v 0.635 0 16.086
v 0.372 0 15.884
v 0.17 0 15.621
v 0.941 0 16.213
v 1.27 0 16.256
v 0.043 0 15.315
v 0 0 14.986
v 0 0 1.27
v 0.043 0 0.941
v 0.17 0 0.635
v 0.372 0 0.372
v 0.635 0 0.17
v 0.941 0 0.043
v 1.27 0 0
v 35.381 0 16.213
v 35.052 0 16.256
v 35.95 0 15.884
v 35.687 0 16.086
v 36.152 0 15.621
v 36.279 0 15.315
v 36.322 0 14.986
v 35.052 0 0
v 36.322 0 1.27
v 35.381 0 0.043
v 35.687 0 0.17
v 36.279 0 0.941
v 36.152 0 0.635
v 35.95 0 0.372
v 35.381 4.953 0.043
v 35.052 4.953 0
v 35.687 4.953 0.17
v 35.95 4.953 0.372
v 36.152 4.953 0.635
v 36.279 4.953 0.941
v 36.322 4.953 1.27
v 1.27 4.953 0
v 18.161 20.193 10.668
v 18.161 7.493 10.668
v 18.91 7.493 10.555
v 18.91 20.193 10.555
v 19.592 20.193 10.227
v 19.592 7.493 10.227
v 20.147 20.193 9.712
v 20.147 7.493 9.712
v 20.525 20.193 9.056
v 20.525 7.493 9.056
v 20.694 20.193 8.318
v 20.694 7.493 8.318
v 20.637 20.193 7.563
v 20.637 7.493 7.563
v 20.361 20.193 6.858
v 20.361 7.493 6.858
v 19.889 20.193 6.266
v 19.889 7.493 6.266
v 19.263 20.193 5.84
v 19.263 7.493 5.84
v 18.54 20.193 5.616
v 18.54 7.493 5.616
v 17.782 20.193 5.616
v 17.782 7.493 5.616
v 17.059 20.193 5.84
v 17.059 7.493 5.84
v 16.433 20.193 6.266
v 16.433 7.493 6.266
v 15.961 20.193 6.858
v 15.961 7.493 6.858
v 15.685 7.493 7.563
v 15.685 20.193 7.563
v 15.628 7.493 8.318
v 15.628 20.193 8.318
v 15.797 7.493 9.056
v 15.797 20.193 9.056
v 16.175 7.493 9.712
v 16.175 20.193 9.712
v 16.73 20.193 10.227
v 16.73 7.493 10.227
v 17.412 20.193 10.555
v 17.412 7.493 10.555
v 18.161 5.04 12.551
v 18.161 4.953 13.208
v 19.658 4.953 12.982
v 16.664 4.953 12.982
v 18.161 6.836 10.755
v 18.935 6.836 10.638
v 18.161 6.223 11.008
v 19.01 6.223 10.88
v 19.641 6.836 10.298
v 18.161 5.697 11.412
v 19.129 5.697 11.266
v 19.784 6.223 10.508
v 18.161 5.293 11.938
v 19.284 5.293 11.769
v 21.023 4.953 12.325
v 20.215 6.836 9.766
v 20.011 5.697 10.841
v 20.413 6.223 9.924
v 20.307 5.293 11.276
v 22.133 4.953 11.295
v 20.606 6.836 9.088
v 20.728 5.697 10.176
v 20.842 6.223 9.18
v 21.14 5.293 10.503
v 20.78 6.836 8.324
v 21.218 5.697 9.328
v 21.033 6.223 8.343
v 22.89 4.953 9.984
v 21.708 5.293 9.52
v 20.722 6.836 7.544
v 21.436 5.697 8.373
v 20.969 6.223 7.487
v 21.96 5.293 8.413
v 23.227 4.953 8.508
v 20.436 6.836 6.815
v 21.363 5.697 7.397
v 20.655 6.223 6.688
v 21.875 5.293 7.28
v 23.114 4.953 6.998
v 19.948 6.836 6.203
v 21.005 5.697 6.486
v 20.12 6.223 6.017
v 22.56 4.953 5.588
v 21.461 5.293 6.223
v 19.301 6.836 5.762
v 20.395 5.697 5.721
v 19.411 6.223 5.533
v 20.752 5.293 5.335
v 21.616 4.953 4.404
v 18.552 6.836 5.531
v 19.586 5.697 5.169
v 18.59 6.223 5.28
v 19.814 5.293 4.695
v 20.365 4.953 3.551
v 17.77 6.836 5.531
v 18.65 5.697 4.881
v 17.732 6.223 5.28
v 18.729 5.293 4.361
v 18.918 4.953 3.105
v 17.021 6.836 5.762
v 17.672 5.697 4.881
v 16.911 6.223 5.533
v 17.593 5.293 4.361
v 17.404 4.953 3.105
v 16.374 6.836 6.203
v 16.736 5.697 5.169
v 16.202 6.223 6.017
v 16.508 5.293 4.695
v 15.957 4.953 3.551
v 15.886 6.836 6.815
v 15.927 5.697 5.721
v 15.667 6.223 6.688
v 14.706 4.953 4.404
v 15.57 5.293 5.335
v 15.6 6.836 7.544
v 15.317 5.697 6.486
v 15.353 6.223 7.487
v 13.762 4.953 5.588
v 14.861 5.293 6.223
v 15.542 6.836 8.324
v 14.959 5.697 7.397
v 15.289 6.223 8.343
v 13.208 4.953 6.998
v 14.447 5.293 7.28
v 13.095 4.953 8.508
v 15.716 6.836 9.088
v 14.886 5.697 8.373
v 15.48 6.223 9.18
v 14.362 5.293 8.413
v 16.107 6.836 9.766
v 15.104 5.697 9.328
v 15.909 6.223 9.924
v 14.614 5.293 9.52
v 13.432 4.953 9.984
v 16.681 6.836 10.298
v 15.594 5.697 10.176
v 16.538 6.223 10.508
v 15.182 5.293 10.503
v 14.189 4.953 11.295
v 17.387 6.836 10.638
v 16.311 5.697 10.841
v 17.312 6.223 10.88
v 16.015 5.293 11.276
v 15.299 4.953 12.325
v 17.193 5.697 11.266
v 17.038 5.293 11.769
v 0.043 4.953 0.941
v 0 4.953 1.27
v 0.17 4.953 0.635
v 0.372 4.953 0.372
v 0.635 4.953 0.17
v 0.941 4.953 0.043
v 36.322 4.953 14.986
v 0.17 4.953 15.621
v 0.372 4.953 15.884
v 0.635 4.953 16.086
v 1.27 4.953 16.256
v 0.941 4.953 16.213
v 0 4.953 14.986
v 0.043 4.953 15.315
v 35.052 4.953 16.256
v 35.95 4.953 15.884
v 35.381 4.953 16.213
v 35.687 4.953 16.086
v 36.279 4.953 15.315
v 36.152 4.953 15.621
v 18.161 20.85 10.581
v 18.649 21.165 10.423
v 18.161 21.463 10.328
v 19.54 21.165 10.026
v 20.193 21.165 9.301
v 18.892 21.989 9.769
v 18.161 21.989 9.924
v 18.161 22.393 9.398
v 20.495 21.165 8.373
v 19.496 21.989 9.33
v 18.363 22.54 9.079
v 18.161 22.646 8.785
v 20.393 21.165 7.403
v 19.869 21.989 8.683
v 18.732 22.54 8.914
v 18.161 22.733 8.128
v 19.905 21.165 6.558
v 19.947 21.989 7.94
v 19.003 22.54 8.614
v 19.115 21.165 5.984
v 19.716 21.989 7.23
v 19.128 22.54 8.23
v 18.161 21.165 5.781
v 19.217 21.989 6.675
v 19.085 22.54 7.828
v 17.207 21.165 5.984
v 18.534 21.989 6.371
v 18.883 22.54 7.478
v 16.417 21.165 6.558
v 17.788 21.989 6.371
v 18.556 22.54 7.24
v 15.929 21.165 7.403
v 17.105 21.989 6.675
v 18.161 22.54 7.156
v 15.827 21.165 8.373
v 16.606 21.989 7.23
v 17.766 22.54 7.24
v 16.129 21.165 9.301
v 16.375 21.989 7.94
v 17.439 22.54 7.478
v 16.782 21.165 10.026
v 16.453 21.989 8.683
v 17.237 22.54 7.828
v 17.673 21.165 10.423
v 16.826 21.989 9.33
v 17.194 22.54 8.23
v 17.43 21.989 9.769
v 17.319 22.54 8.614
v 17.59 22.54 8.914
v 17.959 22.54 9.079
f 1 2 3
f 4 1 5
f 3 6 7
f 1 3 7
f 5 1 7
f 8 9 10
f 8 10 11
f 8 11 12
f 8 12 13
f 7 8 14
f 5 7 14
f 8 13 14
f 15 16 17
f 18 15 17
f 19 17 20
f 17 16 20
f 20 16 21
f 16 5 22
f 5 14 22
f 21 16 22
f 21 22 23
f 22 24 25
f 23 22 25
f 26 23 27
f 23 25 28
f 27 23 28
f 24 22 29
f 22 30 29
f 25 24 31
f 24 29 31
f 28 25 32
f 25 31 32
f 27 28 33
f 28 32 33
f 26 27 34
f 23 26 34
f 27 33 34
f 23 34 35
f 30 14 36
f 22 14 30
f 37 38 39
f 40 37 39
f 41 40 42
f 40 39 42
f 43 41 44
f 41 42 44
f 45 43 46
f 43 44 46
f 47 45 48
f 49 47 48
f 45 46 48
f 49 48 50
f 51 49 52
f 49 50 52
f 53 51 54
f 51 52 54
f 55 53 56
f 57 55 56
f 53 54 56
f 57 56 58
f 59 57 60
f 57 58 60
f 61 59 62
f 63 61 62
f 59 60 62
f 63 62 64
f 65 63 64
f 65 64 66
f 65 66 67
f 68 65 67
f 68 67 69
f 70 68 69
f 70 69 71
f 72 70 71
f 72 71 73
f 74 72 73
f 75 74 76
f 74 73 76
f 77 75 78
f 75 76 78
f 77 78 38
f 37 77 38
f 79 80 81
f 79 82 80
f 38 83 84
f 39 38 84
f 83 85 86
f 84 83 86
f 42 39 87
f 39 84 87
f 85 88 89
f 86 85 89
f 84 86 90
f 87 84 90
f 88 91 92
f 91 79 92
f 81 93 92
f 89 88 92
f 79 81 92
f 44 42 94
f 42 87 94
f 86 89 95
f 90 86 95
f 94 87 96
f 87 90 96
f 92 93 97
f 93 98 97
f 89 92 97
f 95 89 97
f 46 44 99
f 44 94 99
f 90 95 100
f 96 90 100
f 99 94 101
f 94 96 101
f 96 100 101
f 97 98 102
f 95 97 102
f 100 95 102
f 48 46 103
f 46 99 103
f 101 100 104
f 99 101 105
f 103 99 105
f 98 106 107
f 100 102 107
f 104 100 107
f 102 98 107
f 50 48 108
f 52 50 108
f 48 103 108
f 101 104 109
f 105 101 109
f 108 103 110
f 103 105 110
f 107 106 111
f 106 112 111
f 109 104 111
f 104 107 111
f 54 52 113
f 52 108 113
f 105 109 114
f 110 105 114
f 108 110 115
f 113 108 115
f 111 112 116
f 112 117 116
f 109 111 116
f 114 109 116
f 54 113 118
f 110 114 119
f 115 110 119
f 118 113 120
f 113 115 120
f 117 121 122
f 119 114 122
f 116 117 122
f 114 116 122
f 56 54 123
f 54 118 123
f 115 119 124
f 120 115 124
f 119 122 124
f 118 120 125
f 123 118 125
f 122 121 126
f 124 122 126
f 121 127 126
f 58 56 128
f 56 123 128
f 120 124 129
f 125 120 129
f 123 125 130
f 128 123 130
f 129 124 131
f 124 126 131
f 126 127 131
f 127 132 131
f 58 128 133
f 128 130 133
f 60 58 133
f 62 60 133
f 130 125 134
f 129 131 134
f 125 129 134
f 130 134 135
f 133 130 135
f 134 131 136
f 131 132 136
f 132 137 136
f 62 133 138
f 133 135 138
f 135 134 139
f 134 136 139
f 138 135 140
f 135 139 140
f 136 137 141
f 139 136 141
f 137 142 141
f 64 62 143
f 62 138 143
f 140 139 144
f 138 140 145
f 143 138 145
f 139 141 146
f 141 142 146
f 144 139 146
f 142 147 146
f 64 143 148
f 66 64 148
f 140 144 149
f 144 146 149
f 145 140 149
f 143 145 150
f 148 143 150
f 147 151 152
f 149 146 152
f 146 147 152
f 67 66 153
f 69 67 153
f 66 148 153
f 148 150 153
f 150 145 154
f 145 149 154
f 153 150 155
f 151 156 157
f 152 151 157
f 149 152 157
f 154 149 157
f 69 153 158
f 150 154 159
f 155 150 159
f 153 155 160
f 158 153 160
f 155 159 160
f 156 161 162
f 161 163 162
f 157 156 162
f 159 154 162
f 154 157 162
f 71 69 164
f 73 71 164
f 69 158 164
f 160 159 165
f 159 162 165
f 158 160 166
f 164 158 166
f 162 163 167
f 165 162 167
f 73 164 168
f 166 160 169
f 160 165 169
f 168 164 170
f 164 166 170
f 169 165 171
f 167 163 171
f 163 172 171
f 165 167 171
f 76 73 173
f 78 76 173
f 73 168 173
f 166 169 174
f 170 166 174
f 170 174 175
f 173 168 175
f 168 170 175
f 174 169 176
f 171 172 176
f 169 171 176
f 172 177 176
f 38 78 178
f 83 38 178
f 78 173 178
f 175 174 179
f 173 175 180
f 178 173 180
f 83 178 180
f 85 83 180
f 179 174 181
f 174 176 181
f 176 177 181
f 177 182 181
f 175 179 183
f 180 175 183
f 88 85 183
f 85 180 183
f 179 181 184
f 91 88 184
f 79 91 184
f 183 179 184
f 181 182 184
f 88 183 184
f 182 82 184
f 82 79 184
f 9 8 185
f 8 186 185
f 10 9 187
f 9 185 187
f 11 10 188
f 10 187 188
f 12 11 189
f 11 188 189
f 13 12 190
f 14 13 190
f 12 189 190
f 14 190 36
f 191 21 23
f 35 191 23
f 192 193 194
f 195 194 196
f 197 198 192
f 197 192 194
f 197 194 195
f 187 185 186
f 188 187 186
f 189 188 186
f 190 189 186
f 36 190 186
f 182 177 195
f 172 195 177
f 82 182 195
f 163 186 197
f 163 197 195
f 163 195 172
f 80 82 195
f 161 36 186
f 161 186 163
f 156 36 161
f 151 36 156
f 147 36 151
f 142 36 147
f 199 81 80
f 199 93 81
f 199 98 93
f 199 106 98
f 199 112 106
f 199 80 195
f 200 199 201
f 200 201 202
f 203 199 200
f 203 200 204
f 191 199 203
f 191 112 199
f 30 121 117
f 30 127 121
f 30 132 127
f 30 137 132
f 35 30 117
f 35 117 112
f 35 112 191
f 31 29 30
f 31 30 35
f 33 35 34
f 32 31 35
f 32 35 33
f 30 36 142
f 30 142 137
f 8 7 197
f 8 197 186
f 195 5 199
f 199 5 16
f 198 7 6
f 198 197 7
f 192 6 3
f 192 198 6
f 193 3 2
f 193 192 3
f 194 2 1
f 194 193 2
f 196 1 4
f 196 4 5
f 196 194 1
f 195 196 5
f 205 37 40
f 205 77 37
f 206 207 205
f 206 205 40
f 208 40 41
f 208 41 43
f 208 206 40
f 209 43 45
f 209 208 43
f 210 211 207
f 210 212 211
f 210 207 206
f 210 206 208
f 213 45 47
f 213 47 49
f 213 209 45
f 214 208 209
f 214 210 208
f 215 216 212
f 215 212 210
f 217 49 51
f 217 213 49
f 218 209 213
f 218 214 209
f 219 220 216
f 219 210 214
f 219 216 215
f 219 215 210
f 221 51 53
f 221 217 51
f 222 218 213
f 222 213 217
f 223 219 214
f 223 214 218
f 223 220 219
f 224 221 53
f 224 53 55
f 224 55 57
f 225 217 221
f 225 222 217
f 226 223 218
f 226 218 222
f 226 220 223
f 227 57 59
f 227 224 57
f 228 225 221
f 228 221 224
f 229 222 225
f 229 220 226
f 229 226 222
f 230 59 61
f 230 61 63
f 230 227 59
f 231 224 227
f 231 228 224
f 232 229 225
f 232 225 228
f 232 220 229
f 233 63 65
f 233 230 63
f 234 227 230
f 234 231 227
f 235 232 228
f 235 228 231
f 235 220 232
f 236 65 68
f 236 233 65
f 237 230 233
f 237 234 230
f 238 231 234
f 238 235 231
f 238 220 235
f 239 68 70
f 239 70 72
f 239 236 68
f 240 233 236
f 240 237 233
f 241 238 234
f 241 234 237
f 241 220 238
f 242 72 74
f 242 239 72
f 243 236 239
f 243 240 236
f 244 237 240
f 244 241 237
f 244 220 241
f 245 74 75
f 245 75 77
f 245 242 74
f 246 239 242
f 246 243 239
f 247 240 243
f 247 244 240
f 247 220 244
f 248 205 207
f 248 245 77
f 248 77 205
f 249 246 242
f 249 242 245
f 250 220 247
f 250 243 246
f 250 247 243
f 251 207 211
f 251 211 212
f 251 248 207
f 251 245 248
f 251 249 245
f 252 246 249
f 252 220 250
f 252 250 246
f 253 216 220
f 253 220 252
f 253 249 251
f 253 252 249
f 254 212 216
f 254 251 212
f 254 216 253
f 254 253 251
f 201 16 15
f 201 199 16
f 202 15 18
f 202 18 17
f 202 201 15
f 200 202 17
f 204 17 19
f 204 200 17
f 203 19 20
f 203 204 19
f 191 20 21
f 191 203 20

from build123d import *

# Parameters (mm, degrees)
SKETCH1_W           = 36.322
SKETCH1_H           = 16.256
BOSS_EXTRUDE1_DEPTH = 4.953
SKETCH2_R           = 2.54
BOSS_EXTRUDE2_DEPTH = 17.78
FILLET1_R           = 2.54
FILLET2_R           = 2.54
FILLET3_R           = 1.27


with BuildPart() as part:
    # Sketch1 → Boss-Extrude1 (new body)
    with BuildSketch(Plane(origin=(0, 0, 0), x_dir=(1, 0, 0), z_dir=(0, 1, 0))):
        with Locations((18.161, -8.128)):
            Rectangle(SKETCH1_W, SKETCH1_H)
    extrude(amount=BOSS_EXTRUDE1_DEPTH)

    # Sketch2 → Boss-Extrude2 (add)
    with BuildSketch(Plane(origin=(0, 4.953, 0), x_dir=(1, 0, 0), z_dir=(0, 1, 0))):
        with Locations(Location((18.161, -8.128, 0), (0, 0, 270))):
            Circle(SKETCH2_R)
    extrude(amount=BOSS_EXTRUDE2_DEPTH)

    # Fillet1
    fillet1_edges = [part.edges().sort_by_distance(p)[0] for p in [
        (18.161, 22.733, 5.588),
    ]]
    fillet(fillet1_edges, radius=FILLET1_R)

    # Fillet2
    fillet2_edges = [part.edges().sort_by_distance(p)[0] for p in [
        (18.161, 4.953, 5.588),
    ]]
    fillet(fillet2_edges, radius=FILLET2_R)

    # Fillet3
    fillet3_edges = [part.edges().sort_by_distance(p)[0] for p in [
        (0, 2.4765, 0),
        (36.322, 2.4765, 0),
        (36.322, 2.4765, 16.256),
        (0, 2.4765, 16.256),
    ]]
    fillet(fillet3_edges, radius=FILLET3_R)


solid = part.part
